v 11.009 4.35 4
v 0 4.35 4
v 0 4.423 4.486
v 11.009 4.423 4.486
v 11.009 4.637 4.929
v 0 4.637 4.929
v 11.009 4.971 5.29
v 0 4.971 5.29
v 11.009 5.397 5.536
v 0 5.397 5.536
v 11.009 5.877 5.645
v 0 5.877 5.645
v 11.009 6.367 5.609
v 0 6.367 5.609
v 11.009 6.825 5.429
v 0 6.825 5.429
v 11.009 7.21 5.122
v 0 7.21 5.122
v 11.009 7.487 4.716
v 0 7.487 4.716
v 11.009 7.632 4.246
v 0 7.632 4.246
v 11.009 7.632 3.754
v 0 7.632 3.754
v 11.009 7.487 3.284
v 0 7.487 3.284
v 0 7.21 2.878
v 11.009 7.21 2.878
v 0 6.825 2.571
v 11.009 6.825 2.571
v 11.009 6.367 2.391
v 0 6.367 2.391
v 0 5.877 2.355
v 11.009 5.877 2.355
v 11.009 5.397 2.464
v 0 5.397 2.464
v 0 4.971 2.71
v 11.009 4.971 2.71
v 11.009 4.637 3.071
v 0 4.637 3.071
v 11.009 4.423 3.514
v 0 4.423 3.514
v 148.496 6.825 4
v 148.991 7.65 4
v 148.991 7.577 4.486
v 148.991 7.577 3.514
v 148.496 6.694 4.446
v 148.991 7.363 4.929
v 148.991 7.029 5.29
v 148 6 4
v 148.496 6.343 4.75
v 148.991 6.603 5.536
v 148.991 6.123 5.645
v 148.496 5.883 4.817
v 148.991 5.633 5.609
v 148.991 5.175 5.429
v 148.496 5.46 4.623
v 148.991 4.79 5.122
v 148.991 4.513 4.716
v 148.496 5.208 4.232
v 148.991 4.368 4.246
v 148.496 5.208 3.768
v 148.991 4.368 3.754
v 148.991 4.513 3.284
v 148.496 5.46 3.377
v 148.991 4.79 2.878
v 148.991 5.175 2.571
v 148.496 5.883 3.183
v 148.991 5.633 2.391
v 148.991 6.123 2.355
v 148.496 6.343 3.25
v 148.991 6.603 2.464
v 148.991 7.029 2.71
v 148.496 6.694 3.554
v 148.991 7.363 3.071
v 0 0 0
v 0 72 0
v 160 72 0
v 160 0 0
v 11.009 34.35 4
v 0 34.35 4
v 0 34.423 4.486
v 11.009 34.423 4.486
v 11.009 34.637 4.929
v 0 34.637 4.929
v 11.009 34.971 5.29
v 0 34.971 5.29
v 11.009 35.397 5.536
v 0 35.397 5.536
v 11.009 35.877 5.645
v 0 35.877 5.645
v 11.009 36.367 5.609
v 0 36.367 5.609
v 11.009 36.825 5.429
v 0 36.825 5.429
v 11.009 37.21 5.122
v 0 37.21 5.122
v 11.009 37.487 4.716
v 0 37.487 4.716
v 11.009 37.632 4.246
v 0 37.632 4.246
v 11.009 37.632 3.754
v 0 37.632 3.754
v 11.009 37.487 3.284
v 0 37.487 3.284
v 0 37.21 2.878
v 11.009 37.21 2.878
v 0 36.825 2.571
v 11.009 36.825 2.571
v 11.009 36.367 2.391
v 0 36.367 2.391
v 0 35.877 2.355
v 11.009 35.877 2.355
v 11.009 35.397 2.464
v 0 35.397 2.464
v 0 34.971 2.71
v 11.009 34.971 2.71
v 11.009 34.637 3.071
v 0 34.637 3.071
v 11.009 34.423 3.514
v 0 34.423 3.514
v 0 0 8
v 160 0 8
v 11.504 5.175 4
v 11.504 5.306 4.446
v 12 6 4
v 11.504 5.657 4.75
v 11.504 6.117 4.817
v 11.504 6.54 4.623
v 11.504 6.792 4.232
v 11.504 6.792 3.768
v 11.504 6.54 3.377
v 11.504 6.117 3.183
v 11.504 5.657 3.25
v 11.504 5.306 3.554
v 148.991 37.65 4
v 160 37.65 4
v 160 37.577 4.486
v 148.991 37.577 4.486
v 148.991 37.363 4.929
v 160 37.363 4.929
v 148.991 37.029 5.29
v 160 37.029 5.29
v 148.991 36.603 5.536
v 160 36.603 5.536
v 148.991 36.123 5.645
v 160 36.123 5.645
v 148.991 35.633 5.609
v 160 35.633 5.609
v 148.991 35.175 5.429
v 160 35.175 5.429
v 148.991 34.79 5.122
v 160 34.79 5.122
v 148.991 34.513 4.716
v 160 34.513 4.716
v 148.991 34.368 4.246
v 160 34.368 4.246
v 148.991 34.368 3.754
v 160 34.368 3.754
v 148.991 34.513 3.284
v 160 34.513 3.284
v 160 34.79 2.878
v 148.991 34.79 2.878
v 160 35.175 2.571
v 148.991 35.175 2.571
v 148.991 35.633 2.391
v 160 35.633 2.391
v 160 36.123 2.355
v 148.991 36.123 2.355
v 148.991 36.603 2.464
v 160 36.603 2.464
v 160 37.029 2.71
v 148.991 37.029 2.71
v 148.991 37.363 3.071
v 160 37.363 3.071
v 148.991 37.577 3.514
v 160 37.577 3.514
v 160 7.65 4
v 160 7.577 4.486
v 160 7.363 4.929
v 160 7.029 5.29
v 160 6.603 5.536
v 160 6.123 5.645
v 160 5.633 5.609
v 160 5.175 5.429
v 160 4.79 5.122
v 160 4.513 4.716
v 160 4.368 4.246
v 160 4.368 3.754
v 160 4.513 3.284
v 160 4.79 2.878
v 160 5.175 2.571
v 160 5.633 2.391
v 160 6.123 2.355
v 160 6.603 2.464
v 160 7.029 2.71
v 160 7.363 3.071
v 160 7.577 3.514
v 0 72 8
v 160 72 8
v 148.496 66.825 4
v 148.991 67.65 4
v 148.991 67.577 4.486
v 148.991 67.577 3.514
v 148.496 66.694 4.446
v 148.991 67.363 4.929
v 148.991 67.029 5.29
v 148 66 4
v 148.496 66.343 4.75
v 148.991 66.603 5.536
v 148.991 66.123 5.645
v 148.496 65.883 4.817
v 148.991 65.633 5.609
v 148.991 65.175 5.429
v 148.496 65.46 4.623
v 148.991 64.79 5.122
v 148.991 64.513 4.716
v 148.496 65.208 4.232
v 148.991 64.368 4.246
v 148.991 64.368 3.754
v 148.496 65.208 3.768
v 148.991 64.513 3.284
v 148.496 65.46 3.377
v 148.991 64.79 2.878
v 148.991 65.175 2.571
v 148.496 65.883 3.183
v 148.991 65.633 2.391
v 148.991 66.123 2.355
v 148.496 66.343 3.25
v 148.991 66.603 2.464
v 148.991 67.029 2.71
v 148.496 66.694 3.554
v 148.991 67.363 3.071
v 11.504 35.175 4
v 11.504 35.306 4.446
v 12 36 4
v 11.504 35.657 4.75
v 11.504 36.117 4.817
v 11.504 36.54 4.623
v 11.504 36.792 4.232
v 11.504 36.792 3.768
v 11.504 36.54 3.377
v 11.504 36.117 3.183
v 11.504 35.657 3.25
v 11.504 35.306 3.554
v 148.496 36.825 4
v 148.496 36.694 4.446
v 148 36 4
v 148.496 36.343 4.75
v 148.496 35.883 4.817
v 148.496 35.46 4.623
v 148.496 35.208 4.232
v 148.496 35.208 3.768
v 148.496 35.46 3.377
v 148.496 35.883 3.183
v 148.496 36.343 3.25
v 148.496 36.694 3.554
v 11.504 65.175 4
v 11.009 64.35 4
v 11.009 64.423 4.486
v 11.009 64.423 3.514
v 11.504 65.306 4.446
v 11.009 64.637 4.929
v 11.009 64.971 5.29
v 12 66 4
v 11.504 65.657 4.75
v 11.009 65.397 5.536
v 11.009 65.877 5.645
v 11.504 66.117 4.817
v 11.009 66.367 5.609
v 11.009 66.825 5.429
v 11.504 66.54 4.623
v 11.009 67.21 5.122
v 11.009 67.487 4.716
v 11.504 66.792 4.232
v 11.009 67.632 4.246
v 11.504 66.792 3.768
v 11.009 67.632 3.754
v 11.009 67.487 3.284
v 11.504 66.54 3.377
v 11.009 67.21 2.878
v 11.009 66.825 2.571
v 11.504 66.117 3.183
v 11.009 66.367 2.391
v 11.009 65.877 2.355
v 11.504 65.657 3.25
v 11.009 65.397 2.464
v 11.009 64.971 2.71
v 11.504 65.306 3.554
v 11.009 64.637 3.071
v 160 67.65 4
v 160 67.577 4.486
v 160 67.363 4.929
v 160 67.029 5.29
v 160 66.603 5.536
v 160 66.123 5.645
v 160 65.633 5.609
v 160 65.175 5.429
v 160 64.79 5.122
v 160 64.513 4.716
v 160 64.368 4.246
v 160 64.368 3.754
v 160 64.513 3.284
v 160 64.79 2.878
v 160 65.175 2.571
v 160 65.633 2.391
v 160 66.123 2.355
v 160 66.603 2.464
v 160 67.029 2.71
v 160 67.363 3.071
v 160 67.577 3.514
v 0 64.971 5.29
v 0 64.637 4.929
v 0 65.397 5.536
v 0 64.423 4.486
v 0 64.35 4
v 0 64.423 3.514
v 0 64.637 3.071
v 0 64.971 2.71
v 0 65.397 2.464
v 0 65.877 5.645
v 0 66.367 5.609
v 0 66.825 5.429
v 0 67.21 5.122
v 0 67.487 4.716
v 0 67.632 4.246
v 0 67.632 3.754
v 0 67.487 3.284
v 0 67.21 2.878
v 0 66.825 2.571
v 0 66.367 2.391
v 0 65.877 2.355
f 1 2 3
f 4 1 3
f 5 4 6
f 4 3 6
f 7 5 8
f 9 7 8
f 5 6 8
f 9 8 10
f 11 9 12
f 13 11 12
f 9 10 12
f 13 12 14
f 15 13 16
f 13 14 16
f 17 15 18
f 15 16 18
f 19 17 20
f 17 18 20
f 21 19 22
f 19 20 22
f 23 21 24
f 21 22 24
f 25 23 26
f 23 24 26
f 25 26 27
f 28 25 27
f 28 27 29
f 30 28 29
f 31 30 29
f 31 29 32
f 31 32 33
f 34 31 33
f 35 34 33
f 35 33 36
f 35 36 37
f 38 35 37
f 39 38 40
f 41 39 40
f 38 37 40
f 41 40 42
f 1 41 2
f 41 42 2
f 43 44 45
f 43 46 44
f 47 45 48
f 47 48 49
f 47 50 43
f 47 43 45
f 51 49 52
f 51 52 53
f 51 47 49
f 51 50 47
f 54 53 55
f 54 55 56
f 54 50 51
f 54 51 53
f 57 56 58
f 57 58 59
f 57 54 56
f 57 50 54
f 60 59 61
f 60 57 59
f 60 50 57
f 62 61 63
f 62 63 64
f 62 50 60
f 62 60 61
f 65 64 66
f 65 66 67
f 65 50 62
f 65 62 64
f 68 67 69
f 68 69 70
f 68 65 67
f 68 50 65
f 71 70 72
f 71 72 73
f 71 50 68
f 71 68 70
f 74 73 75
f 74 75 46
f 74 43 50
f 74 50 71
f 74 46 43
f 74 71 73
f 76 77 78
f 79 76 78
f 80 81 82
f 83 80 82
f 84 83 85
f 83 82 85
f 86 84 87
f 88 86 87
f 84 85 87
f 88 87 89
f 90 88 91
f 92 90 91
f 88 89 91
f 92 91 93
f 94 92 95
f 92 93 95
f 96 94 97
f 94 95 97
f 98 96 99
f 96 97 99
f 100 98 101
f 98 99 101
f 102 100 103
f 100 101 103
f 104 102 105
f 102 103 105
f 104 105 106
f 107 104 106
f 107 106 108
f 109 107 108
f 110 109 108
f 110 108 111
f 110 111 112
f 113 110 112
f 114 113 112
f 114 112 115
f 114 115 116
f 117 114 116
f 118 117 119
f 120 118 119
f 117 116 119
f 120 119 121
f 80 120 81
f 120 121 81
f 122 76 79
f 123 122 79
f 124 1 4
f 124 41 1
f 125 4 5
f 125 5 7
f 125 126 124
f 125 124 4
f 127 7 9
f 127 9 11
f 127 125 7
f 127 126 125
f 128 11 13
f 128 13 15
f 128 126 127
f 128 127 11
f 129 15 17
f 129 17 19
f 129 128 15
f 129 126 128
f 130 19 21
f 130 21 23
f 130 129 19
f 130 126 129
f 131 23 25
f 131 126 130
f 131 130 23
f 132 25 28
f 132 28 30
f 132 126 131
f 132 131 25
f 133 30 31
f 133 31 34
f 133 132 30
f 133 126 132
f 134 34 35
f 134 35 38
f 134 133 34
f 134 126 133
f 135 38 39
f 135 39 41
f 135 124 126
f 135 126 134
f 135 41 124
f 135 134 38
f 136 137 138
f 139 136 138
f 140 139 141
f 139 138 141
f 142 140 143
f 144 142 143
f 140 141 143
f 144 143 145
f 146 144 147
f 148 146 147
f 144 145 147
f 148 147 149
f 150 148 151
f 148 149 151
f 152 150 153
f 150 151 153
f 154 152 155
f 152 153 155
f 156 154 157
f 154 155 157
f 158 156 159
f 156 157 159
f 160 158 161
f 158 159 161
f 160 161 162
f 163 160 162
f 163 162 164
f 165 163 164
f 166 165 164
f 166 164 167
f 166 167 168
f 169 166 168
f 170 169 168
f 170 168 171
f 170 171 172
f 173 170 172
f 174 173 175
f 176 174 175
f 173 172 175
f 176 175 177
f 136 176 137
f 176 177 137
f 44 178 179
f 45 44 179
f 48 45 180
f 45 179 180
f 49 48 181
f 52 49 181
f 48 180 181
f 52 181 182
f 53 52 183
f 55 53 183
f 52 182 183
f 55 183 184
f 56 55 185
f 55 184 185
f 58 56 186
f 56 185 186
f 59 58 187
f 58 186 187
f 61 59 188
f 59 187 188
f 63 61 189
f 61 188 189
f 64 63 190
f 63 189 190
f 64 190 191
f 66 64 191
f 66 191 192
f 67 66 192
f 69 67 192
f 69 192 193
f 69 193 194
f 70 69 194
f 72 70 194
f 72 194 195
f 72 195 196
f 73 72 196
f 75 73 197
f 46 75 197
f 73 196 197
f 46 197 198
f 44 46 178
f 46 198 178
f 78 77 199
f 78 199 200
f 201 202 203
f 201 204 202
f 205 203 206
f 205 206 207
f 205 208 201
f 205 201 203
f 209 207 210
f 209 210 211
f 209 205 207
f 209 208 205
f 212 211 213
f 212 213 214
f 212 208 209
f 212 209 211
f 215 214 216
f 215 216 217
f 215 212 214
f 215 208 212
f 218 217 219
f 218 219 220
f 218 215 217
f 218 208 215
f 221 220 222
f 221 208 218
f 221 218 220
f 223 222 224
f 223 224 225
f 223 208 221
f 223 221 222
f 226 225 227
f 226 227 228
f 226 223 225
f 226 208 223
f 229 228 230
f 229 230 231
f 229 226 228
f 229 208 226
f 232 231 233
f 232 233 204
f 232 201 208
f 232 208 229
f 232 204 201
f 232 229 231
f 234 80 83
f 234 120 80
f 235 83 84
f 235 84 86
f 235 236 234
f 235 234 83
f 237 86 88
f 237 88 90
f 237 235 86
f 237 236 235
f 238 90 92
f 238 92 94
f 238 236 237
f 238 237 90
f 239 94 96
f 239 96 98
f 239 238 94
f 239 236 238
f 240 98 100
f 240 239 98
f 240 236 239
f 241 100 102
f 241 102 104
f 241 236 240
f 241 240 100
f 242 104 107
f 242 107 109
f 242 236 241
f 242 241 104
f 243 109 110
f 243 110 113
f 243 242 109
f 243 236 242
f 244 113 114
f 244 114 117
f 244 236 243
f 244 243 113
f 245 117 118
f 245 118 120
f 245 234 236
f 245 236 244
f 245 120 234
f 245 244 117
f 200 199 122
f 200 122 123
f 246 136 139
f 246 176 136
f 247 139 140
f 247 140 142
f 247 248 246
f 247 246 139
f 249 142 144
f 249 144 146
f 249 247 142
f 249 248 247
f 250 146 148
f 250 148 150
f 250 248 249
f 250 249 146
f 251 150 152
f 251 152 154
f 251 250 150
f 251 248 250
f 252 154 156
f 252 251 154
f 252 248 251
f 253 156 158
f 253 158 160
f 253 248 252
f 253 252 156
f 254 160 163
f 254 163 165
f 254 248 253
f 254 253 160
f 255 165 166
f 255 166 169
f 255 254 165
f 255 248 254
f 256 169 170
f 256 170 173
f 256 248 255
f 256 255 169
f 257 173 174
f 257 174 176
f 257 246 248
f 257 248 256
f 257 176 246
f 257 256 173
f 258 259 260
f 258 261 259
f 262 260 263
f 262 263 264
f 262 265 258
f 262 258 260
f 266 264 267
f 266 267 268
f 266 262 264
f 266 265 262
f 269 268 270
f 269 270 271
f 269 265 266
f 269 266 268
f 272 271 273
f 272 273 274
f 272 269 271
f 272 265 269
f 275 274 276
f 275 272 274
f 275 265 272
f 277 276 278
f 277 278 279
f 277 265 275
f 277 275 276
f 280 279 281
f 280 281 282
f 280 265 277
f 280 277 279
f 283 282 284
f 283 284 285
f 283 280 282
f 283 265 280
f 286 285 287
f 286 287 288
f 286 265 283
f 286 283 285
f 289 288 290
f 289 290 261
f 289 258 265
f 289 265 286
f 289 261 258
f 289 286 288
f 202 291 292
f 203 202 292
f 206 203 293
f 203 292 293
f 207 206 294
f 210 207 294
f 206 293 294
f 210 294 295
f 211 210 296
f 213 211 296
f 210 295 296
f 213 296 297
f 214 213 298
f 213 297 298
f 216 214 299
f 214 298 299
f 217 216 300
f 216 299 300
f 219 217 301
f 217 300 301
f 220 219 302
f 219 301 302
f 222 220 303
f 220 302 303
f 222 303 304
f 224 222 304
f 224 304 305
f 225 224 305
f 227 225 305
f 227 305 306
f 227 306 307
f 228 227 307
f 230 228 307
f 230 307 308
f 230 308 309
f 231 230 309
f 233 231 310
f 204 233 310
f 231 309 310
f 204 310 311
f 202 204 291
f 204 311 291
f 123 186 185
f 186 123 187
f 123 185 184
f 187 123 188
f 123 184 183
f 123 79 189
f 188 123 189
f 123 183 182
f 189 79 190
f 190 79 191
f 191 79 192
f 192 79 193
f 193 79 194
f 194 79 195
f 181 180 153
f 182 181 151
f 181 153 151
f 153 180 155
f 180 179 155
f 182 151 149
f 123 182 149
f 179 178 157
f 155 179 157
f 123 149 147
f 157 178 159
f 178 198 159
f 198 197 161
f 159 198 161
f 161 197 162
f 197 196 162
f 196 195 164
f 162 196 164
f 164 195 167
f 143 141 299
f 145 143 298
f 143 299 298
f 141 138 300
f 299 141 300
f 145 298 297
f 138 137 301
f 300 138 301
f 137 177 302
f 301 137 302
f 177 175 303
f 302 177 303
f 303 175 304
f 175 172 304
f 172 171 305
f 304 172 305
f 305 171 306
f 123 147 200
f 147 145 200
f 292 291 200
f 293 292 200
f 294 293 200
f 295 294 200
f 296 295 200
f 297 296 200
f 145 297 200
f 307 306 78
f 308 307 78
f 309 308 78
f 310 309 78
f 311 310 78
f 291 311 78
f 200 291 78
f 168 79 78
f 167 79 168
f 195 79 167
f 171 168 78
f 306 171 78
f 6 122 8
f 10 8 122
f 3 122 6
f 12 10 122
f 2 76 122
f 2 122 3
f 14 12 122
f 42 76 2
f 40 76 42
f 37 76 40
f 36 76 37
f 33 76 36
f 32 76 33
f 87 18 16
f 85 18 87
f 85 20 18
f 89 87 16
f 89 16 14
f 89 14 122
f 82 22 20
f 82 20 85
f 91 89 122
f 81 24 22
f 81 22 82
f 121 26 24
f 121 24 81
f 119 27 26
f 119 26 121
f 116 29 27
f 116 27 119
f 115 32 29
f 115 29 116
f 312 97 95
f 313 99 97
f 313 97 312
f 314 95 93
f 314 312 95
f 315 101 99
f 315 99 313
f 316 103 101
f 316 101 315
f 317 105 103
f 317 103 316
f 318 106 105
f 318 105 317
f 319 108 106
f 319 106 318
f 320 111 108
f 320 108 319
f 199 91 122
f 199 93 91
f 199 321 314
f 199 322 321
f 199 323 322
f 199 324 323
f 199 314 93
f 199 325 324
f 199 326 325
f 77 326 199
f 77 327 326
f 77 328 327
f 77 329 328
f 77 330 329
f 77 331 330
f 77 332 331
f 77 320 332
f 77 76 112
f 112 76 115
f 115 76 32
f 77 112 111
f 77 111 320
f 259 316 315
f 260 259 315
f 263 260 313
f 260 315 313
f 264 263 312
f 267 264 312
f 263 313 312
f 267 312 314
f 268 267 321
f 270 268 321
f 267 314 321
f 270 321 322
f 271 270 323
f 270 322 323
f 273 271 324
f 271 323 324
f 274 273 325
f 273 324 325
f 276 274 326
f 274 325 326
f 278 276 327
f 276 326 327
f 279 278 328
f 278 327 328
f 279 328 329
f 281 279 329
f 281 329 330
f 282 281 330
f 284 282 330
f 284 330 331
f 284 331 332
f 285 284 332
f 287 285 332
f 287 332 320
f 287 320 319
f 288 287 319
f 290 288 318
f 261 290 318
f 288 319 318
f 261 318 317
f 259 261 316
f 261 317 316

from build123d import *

# Parameters (mm, degrees)
BOX_W          = 160
BOX_H          = 72
BOX_DEPTH      = 8
SKETCH_R       = 1.65
HOLE_DEPTH     = 11.00858
HOLE_TIPS_R    = 1.65
SKETCH001_R    = 1.65
HOLE001_DEPTH  = 11.00858
HOLE001_TIPS_R = 1.65


with BuildPart() as part:
    # Box → Box (new body)
    with BuildSketch(Plane.XY):
        with Locations((80, 36)):
            Rectangle(BOX_W, BOX_H)
    extrude(amount=BOX_DEPTH)

    # Sketch (on Face1 of BaseFeature) → Hole (cut)
    with BuildSketch(Plane(origin=(0, 0, 0), x_dir=(0, -1, 0), z_dir=(-1, 0, 0))):
        with Locations((-66, 4)):
            Circle(SKETCH_R)
        with Locations((-36, 4)):
            Circle(SKETCH_R)
        with Locations((-6, 4)):
            Circle(SKETCH_R)
    extrude(amount=-HOLE_DEPTH, mode=Mode.SUBTRACT)

    # Hole tips → Hole tip 1 section 0
    with BuildSketch(Plane(origin=(11.00858, 0, 0), x_dir=(0, -1, 0), z_dir=(-1, 0, 0)), mode=Mode.PRIVATE) as hole_tip_1_s0:
        with Locations((-66, 4)):
            Circle(HOLE_TIPS_R)
    loft([hole_tip_1_s0.sketch, Vertex(12, 66, 4)], mode=Mode.SUBTRACT)

    # Hole tips → Hole tip 2 section 0
    with BuildSketch(Plane(origin=(11.00858, 0, 0), x_dir=(0, -1, 0), z_dir=(-1, 0, 0)), mode=Mode.PRIVATE) as hole_tip_2_s0:
        with Locations((-36, 4)):
            Circle(HOLE_TIPS_R)
    loft([hole_tip_2_s0.sketch, Vertex(12, 36, 4)], mode=Mode.SUBTRACT)

    # Hole tips → Hole tip 3 section 0
    with BuildSketch(Plane(origin=(11.00858, 0, 0), x_dir=(0, -1, 0), z_dir=(-1, 0, 0)), mode=Mode.PRIVATE) as hole_tip_3_s0:
        with Locations((-6, 4)):
            Circle(HOLE_TIPS_R)
    loft([hole_tip_3_s0.sketch, Vertex(12, 6, 4)], mode=Mode.SUBTRACT)

    # Sketch001 (on Face9 of Hole) → Hole001 (cut)
    with BuildSketch(Plane.YZ.offset(160)):
        with Locations((6, 4)):
            Circle(SKETCH001_R)
        with Locations((36, 4)):
            Circle(SKETCH001_R)
        with Locations((66, 4)):
            Circle(SKETCH001_R)
    extrude(amount=-HOLE001_DEPTH, mode=Mode.SUBTRACT)

    # Hole001 tips → Hole001 tip 1 section 0
    with BuildSketch(Plane.YZ.offset(148.99142), mode=Mode.PRIVATE) as hole001_tip_1_s0:
        with Locations((6, 4)):
            Circle(HOLE001_TIPS_R)
    loft([hole001_tip_1_s0.sketch, Vertex(148, 6, 4)], mode=Mode.SUBTRACT)

    # Hole001 tips → Hole001 tip 2 section 0
    with BuildSketch(Plane.YZ.offset(148.99142), mode=Mode.PRIVATE) as hole001_tip_2_s0:
        with Locations((36, 4)):
            Circle(HOLE001_TIPS_R)
    loft([hole001_tip_2_s0.sketch, Vertex(148, 36, 4)], mode=Mode.SUBTRACT)

    # Hole001 tips → Hole001 tip 3 section 0
    with BuildSketch(Plane.YZ.offset(148.99142), mode=Mode.PRIVATE) as hole001_tip_3_s0:
        with Locations((66, 4)):
            Circle(HOLE001_TIPS_R)
    loft([hole001_tip_3_s0.sketch, Vertex(148, 66, 4)], mode=Mode.SUBTRACT)


solid = part.part
